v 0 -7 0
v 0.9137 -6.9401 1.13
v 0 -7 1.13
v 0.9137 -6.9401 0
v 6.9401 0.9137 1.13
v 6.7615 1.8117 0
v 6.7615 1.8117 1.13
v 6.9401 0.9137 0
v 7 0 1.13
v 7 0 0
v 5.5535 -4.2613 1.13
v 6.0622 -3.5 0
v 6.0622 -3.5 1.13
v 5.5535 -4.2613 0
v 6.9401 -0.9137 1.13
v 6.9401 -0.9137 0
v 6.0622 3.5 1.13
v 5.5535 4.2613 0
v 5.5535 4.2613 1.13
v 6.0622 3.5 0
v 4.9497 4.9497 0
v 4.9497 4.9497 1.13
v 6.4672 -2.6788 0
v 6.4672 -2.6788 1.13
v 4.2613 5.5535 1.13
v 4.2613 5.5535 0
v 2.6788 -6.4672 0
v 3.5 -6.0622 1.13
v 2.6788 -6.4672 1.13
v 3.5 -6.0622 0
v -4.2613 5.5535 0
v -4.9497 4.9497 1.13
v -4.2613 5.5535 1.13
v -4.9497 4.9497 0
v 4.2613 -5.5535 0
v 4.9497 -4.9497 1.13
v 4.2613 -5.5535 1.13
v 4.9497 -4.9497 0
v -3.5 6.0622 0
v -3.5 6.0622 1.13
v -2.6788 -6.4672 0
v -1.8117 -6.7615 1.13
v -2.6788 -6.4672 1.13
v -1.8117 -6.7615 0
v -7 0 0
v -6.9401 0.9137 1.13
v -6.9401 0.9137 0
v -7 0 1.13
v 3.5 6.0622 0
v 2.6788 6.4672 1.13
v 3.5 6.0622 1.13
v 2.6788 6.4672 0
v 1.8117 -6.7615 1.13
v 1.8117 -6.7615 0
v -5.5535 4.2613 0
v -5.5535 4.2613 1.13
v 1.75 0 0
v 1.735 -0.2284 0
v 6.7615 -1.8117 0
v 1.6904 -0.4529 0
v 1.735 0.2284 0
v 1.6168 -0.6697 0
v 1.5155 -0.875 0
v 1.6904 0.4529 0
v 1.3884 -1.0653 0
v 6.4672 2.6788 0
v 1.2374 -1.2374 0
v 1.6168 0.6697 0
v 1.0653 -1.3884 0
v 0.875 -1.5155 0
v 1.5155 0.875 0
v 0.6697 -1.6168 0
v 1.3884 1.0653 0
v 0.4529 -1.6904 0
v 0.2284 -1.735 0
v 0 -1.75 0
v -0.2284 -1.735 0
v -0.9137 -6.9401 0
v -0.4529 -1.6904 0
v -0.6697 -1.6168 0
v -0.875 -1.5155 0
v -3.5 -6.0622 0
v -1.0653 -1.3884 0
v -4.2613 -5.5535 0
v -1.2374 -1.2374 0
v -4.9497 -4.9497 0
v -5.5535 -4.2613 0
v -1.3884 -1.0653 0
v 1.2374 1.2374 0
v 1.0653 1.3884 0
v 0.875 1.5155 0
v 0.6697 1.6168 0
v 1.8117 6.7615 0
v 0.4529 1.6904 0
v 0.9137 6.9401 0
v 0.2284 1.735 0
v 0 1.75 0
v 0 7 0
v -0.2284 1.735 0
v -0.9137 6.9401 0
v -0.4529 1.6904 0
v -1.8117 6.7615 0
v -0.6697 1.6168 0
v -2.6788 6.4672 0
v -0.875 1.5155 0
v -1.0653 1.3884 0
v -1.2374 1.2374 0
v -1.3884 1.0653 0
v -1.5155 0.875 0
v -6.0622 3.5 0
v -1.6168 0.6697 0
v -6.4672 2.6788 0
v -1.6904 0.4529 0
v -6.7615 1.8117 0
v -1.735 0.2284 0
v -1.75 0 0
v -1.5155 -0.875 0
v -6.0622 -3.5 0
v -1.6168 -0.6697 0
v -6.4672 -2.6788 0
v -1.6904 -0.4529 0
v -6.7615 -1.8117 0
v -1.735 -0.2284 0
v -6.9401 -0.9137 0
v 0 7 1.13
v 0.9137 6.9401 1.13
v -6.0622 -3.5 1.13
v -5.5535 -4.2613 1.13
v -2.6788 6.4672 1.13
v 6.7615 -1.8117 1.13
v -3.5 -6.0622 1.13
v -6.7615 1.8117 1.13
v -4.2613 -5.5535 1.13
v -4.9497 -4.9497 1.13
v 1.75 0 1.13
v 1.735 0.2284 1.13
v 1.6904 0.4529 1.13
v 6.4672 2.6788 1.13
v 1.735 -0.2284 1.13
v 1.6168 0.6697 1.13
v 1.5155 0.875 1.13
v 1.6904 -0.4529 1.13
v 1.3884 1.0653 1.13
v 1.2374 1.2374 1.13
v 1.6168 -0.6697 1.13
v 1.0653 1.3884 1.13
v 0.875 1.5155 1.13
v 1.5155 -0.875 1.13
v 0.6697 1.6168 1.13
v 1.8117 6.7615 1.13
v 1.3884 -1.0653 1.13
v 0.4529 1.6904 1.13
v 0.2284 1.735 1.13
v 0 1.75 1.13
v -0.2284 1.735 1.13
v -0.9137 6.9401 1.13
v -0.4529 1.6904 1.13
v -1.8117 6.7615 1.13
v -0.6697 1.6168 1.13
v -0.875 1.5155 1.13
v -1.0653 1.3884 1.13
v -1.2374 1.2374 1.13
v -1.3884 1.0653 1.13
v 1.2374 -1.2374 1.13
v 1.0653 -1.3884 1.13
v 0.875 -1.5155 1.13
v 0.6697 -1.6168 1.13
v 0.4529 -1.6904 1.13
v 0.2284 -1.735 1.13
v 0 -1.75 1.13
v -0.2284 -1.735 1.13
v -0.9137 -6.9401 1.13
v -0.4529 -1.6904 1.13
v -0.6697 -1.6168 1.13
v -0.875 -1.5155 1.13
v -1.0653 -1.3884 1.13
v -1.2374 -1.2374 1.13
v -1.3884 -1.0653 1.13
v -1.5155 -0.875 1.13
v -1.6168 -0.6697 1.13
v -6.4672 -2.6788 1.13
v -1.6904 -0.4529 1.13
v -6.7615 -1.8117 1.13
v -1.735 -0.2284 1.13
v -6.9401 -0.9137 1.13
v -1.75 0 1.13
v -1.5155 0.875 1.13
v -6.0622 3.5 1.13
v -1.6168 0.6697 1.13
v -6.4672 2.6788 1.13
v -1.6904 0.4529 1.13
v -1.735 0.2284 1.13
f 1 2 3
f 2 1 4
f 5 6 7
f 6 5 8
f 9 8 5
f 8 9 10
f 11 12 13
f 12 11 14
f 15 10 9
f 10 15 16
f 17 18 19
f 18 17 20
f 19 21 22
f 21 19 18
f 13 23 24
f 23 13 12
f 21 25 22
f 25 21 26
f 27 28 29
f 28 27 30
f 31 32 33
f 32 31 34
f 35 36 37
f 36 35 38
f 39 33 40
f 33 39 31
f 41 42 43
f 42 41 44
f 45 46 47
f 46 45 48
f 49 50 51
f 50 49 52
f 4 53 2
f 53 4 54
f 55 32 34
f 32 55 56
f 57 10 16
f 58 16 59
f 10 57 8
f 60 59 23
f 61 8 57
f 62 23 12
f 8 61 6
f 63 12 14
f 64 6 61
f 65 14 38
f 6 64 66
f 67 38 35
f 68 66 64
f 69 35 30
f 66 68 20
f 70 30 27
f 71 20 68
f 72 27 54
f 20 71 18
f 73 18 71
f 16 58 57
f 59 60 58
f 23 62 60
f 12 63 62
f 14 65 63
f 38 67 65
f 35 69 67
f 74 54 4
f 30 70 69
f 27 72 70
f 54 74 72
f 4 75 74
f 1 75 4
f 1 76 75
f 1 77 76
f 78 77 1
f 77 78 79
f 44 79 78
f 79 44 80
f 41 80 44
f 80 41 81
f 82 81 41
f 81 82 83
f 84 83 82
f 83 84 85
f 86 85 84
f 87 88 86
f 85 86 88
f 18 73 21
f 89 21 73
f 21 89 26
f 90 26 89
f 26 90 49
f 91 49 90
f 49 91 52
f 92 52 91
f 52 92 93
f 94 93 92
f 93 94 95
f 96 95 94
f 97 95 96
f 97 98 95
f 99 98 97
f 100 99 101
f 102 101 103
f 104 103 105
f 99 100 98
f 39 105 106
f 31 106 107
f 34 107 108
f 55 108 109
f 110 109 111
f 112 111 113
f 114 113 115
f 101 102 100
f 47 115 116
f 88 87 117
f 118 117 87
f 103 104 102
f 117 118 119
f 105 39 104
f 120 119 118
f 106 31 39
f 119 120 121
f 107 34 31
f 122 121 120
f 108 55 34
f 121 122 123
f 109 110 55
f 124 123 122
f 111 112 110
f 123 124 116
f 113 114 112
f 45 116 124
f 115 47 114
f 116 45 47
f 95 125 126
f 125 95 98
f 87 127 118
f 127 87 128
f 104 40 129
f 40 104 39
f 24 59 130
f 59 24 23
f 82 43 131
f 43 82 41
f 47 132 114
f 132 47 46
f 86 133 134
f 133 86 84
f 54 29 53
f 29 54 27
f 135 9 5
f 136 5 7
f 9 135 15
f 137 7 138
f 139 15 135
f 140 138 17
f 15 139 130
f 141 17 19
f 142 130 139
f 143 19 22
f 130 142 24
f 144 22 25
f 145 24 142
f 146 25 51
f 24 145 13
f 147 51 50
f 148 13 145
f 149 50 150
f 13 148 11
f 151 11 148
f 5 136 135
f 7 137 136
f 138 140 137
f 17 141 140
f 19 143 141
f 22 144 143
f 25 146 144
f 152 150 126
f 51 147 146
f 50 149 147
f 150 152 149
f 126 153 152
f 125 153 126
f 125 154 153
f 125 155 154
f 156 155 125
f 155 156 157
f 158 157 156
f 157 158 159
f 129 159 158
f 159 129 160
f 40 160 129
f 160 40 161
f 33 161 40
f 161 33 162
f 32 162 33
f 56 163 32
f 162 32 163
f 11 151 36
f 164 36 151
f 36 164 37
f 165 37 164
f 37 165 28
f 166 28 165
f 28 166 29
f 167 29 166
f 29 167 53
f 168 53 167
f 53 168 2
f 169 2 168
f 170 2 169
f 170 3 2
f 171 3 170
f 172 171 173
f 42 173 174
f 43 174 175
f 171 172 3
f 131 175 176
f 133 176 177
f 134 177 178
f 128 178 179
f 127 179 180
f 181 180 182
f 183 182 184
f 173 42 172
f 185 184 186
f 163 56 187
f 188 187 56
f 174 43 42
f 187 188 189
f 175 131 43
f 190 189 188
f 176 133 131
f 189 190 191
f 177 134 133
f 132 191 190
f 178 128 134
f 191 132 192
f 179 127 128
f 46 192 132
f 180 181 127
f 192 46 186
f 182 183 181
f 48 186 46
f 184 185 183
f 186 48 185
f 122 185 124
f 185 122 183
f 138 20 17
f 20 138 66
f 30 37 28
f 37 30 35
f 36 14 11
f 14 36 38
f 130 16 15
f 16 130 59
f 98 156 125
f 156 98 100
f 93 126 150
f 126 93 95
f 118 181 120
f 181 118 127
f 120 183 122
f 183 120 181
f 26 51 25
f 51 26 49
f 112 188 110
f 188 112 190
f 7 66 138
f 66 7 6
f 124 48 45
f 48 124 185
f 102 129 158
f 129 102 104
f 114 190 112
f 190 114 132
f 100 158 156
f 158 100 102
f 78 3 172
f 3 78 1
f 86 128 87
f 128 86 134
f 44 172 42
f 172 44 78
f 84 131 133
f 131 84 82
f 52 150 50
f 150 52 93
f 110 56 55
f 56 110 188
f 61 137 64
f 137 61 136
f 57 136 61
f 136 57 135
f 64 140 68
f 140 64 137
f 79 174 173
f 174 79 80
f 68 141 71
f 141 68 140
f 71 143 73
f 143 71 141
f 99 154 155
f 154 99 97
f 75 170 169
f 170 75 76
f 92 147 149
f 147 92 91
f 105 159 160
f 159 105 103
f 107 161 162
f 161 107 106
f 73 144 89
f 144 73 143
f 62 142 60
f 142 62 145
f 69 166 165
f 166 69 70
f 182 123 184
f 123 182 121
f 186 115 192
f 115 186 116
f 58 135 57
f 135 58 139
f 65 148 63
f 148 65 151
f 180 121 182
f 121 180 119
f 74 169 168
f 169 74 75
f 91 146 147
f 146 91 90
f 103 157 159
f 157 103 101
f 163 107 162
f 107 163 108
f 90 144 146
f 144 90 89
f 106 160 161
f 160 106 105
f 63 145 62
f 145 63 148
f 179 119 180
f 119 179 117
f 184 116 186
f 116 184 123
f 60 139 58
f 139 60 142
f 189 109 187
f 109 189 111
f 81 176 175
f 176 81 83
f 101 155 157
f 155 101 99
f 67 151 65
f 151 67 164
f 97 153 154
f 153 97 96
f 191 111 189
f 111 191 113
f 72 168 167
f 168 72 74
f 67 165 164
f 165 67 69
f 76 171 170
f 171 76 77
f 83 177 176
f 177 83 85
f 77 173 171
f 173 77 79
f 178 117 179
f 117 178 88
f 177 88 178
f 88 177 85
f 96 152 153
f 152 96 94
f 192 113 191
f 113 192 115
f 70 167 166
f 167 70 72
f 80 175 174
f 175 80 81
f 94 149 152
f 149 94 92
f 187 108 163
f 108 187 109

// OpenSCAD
// file: parameters.scad
// =============================================================================
// Gen-AR Stacked dual-stator mid-rotor copper-max hyper - WOUND-AWARE (HARD GATE)
// ONE mid dual-face Halbach rotor | TWO wound pancake stators | 18 coils x175 t
// =============================================================================

wire_awg            = 26;
wire_od             = 0.45;
turns               = 175;      // +10 vs Gen-AO 165; 18x175x~0.117 ~ 368 m
fill                = 0.70;
layers_per_face     = 2;
wind_build_axial    = layers_per_face * wire_od * fill;   // 0.63
wind_build_radial   = 3 * wire_od * fill;                 // 0.945

coil_id_r           = 17.5;
coil_od_r           = 61.5;
span_deg            = 34.0;     // 9 stations x 40 deg
former_web          = 1.25;     // thinner vs AO 1.30
flange_t            = 0.60;
wall                = 1.2;
slot_w              = 2.4;
mount_hole          = 3.5;
tab_len             = 7.0;

former_bare_h       = former_web + 2 * flange_t;            // 2.45
coil_envelope_h     = former_bare_h + 2 * wind_build_axial; // 3.71

run_clear           = 0.50;
gap_spacer_h        = run_clear + wind_build_axial;         // 1.13
m2m                 = coil_envelope_h + 2 * run_clear;      // 4.71 per gap

coil_stations       = 9;        // per stator; x2 = 18 total
bay_r_in            = coil_id_r - 2.0 - wind_build_radial;
bay_r_out           = coil_od_r + 2.0 + wind_build_radial;
bay_span            = span_deg + 4.0;
bay_offset          = 2.0;
bay_depth           = former_bare_h + wind_build_axial;     // wound sits in bay
stator_back_web     = 2.0;
stator_thick        = bay_depth + stator_back_web;
stator_od           = 156.0;
shaft_clear_stator  = 38.0;
coil_mount_r        = 27.0;

large_pocket_d      = 20.3;
small_pocket_d      = 5.3;
pocket_h            = 5.2;
large_n             = 8;
R_large             = 39.5;     // tighter copper overlap vs AO R=40
R_small_inner       = 26.0;
R_small_mid         = 39.5;
R_small_outer       = 56.0;
carrier_od          = 154.0;
mid_carrier_thick   = 12.0;
hub_h               = 10.0;
hub_od              = 30.0;
rotor_b_offset_deg  = 22.5;

shaft_bore          = 8.35;
bearing_d           = 21.85;
bearing_h           = 7.2;
m3_clear            = 3.5;
bolt_r_inner        = 36.0;
bolt_n_inner        = 6;
flange_bolt_r       = 72.0;
flange_bolt_n       = 6;
brace_r             = 68.0;
brace_d             = 4.3;
brace_n             = 4;

spacer_pad_od       = 14.0;
spacer_pad_id       = m3_clear;
endbell_od          = 156.0;
endbell_thick       = 8.0;
endbell_shaft_clear = 10.0;

$fn = 64;
// main file
// Gen-AR gap spacer — h = run_clear + wind_build_axial
include <parameters.scad>;
$fn = 48;
difference() {
    cylinder(d=spacer_pad_od, h=gap_spacer_h);
    translate([0, 0, -0.1]) cylinder(d=spacer_pad_id, h=gap_spacer_h + 0.2);
}
